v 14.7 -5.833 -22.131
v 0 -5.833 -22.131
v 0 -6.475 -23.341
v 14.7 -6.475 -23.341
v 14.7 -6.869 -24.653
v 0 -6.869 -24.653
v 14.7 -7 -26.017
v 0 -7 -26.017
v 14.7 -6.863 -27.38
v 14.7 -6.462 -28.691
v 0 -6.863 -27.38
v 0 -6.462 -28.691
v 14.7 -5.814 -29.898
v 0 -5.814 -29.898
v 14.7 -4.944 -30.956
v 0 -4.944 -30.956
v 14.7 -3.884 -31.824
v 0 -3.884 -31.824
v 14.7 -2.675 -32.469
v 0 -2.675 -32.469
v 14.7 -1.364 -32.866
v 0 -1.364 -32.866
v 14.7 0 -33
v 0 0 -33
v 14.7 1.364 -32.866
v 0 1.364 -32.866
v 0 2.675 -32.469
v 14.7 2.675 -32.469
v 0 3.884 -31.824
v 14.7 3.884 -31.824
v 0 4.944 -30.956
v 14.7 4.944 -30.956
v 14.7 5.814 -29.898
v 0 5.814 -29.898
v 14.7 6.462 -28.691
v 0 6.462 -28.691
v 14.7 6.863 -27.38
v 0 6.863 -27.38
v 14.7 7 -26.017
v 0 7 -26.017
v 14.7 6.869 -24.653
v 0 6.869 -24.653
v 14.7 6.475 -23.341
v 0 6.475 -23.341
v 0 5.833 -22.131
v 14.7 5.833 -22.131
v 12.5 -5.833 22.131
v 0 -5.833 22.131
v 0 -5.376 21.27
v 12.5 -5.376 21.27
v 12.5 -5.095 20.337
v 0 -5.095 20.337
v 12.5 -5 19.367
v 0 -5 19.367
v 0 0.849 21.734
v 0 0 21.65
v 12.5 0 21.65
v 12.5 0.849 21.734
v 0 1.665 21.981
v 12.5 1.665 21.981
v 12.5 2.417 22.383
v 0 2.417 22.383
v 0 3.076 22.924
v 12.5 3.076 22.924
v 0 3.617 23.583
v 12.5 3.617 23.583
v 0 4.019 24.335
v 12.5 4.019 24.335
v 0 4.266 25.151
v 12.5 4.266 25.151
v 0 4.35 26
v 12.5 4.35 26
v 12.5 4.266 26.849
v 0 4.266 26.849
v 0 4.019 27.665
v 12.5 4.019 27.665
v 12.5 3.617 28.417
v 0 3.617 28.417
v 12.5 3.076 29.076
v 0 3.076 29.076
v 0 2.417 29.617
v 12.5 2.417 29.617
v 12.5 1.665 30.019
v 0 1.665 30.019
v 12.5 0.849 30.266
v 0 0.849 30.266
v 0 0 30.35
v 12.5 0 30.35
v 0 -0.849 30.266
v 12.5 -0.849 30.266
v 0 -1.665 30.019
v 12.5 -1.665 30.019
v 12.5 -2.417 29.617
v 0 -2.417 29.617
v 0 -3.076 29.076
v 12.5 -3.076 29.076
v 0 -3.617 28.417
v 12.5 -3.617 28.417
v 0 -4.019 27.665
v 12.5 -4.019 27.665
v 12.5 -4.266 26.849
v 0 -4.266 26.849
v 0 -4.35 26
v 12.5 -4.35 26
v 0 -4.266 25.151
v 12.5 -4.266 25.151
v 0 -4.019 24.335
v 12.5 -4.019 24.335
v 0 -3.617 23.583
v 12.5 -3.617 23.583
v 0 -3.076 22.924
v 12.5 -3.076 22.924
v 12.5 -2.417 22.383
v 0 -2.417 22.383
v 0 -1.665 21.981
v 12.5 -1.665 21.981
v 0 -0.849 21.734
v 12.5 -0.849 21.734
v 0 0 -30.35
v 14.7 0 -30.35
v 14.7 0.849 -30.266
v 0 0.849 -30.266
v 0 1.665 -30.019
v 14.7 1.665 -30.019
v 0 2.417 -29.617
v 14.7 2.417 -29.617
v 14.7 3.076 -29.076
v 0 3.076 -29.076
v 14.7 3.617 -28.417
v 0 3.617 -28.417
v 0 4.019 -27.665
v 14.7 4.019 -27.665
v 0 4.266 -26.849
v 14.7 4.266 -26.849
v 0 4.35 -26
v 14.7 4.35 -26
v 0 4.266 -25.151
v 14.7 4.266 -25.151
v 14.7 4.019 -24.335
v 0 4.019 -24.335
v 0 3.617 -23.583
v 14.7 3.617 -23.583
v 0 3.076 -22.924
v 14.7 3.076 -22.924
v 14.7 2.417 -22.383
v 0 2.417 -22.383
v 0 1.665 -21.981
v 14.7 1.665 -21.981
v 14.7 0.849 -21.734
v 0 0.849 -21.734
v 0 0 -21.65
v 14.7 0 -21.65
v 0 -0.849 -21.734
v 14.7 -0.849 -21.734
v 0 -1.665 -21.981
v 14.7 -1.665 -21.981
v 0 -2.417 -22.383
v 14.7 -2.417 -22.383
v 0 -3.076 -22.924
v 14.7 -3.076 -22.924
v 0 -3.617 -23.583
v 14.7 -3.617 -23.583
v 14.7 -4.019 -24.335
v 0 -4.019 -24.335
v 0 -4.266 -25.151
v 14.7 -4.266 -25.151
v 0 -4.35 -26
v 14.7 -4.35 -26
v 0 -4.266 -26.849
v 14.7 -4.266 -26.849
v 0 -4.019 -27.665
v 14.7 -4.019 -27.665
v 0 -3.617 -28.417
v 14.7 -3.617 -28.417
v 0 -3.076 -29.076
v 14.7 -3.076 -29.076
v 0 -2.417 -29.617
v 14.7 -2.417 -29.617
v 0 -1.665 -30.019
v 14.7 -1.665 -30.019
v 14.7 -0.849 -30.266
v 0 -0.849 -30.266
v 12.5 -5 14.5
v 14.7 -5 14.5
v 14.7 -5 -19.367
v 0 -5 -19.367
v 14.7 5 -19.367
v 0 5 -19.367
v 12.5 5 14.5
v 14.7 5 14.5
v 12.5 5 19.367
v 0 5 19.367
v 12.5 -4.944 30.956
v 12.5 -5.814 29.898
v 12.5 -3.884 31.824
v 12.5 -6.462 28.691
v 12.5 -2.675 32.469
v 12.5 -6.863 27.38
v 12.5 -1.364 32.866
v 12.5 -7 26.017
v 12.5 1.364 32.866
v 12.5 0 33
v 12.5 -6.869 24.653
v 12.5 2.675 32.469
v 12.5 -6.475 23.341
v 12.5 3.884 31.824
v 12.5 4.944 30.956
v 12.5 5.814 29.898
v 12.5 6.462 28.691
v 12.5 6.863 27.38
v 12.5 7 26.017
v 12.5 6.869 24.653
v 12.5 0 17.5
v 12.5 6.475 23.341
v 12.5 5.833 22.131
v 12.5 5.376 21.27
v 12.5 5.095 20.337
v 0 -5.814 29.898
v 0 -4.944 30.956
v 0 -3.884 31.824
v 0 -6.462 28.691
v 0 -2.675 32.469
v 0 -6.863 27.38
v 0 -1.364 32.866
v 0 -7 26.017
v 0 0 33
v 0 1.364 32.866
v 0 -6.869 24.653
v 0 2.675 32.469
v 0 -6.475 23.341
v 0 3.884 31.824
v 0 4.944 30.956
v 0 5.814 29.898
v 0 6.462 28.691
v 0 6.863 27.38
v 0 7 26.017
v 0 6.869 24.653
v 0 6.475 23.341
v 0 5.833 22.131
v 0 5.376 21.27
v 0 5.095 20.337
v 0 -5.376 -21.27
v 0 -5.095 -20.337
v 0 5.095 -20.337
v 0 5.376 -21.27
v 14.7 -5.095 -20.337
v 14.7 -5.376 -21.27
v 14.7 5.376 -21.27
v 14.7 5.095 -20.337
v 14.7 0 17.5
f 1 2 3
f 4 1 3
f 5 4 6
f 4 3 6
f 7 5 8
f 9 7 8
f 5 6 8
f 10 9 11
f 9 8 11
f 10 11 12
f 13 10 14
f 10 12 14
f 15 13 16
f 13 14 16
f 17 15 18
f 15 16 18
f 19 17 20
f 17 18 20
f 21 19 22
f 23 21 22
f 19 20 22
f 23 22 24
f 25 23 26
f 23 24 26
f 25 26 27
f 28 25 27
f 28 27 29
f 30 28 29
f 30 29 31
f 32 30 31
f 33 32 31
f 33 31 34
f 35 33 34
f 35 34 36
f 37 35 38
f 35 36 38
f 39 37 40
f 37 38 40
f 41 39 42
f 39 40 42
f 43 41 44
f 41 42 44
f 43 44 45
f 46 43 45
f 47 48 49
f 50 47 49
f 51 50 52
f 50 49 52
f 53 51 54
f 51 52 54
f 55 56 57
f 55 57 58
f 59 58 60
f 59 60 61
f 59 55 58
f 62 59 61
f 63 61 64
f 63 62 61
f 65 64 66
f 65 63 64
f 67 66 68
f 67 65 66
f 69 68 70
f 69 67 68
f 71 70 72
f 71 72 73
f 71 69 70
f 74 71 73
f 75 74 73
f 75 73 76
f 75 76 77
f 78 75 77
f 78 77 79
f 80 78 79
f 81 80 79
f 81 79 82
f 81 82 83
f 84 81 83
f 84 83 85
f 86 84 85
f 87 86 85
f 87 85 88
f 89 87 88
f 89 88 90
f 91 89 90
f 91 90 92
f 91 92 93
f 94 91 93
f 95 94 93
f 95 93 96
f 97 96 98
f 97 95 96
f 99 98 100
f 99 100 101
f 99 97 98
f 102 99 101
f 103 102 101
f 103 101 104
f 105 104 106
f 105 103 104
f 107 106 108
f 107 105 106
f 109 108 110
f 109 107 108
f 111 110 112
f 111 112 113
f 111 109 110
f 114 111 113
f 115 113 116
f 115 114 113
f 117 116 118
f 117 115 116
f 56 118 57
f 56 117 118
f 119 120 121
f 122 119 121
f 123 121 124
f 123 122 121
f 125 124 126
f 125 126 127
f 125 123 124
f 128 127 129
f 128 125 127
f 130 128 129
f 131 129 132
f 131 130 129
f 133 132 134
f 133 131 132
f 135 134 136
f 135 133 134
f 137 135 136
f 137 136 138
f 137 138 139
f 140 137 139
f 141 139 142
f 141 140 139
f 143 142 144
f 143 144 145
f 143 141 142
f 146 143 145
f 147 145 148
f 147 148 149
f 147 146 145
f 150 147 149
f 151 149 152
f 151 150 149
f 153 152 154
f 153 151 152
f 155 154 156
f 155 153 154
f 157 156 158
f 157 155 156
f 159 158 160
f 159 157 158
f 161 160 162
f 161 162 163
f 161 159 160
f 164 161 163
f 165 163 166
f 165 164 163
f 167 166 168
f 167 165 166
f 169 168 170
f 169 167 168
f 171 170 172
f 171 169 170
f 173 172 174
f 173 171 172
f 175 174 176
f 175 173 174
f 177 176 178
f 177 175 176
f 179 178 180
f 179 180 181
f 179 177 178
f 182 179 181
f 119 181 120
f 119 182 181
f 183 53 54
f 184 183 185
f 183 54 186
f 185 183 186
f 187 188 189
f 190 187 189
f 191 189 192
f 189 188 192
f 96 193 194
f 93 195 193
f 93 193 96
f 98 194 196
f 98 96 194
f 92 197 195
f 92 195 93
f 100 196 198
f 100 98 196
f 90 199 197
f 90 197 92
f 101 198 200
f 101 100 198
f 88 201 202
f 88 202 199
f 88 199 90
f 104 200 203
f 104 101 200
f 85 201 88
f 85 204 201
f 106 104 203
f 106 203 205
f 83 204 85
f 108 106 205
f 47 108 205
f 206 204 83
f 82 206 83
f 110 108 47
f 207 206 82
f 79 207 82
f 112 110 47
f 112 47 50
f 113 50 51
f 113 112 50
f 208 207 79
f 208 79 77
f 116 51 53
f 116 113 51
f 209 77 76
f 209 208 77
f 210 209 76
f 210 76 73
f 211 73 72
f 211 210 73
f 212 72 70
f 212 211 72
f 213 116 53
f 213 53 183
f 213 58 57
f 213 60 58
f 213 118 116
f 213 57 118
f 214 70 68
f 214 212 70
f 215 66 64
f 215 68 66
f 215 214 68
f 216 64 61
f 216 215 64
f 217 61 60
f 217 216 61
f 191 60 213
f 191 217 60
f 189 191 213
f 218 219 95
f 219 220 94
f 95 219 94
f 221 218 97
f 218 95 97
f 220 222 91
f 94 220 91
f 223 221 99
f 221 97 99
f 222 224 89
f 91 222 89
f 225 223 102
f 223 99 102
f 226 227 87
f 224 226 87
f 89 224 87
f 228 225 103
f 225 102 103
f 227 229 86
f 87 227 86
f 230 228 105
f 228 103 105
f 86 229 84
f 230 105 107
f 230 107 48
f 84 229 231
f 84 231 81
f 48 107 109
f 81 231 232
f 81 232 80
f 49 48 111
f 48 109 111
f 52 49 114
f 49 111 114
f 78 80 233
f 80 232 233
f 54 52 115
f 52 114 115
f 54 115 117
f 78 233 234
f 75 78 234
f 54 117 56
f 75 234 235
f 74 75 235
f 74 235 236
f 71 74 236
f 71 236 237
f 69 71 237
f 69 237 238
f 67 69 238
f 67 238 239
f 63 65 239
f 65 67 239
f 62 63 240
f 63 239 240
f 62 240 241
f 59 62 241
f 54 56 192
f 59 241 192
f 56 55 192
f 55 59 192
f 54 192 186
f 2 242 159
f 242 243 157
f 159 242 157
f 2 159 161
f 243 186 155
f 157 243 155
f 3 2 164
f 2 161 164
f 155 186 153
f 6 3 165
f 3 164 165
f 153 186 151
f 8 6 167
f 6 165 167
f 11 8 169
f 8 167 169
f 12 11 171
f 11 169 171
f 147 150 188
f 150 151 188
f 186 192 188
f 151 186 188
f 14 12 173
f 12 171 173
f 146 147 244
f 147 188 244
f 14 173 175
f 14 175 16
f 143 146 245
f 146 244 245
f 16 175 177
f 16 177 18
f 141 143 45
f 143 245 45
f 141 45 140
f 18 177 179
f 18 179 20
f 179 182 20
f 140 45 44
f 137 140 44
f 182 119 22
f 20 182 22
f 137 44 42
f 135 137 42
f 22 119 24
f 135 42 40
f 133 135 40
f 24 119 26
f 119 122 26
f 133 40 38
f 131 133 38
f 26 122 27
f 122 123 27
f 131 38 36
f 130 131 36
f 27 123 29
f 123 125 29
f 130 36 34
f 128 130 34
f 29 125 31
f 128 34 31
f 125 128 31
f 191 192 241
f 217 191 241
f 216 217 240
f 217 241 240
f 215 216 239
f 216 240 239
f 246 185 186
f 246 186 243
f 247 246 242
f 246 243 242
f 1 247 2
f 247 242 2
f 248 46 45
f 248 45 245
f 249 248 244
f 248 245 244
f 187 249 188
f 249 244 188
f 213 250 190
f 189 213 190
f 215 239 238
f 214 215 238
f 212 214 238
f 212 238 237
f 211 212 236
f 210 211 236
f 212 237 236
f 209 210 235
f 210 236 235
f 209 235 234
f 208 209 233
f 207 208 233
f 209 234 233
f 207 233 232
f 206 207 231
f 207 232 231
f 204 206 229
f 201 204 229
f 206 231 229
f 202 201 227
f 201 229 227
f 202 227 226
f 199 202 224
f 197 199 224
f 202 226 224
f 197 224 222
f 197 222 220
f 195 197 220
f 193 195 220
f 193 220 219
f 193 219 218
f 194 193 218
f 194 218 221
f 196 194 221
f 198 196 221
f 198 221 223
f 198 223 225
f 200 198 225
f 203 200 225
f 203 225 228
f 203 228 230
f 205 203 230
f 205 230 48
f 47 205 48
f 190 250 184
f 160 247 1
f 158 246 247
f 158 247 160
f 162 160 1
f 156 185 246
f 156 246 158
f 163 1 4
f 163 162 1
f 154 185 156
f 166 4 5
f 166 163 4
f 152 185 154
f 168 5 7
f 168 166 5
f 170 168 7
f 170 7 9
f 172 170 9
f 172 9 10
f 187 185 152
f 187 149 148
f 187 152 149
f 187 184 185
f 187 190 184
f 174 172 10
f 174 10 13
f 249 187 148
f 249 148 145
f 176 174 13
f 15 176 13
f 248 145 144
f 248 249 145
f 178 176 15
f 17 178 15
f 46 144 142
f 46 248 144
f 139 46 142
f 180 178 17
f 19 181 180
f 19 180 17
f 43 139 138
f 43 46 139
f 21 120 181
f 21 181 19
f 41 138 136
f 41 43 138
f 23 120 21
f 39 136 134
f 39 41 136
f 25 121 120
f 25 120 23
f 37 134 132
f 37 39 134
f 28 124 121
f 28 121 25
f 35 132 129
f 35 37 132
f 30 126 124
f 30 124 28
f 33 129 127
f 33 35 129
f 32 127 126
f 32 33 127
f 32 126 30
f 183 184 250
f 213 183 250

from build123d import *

# Parameters (mm, degrees)
CROQUIS1_R              = 4.35
SALIENTE_EXTRUIR1_DEPTH = 14.7
CROQUIS2_R              = 4.35
CORTAR_EXTRUIR1_DEPTH   = 2.2


with BuildPart() as part:
    # Croquis1 → Saliente-Extruir1 (new body)
    with BuildSketch(Plane(origin=(0, 0, 0), x_dir=(0, 0, -1), z_dir=(1, 0, 0))):
        with BuildLine():
            Line((19.366750419, 5), (-19.366750419, 5))
            ThreePointArc((-19.366750419, 5), (-20.810126092, 5.212864461), (-22.130604411, 5.833333333))
            ThreePointArc((-22.130604411, 5.833333333), (-33, 0), (-22.130604411, -5.833333333))
            ThreePointArc((-22.130604411, -5.833333333), (-20.810126092, -5.212864461), (-19.366750419, -5))
            Line((-19.366750419, -5), (19.366750419, -5))
            ThreePointArc((19.366750419, -5), (20.810126092, -5.212864461), (22.130604411, -5.833333333))
            ThreePointArc((22.130604411, -5.833333333), (33, 0), (22.130604411, 5.833333333))
            ThreePointArc((22.130604411, 5.833333333), (20.810126092, 5.212864461), (19.366750419, 5))
        make_face()
        with Locations((-26, 0)):
            Circle(CROQUIS1_R, mode=Mode.SUBTRACT)
        with Locations((26, 0)):
            Circle(CROQUIS1_R, mode=Mode.SUBTRACT)
    extrude(amount=SALIENTE_EXTRUIR1_DEPTH)

    # Croquis2 → Cortar-Extruir1 (cut)
    with BuildSketch(Plane(origin=(14.7, 0, 0), x_dir=(0, 0, -1), z_dir=(1, 0, 0))):
        with BuildLine():
            Line((-17.5, 0), (-14.5, 5))
            Line((-14.5, 5), (-19.366750419, 5))
            ThreePointArc((-19.366750419, 5), (-20.810126092, 5.212864461), (-22.130604411, 5.833333333))
            ThreePointArc((-22.130604411, 5.833333333), (-33, 0), (-22.130604411, -5.833333333))
            ThreePointArc((-22.130604411, -5.833333333), (-20.810126092, -5.212864461), (-19.366750419, -5))
            Line((-19.366750419, -5), (-14.5, -5))
            Line((-14.5, -5), (-17.5, 0))
        make_face()
        with Locations((-26, 0)):
            Circle(CROQUIS2_R, mode=Mode.SUBTRACT)
    extrude(amount=-CORTAR_EXTRUIR1_DEPTH, mode=Mode.SUBTRACT)


solid = part.part
